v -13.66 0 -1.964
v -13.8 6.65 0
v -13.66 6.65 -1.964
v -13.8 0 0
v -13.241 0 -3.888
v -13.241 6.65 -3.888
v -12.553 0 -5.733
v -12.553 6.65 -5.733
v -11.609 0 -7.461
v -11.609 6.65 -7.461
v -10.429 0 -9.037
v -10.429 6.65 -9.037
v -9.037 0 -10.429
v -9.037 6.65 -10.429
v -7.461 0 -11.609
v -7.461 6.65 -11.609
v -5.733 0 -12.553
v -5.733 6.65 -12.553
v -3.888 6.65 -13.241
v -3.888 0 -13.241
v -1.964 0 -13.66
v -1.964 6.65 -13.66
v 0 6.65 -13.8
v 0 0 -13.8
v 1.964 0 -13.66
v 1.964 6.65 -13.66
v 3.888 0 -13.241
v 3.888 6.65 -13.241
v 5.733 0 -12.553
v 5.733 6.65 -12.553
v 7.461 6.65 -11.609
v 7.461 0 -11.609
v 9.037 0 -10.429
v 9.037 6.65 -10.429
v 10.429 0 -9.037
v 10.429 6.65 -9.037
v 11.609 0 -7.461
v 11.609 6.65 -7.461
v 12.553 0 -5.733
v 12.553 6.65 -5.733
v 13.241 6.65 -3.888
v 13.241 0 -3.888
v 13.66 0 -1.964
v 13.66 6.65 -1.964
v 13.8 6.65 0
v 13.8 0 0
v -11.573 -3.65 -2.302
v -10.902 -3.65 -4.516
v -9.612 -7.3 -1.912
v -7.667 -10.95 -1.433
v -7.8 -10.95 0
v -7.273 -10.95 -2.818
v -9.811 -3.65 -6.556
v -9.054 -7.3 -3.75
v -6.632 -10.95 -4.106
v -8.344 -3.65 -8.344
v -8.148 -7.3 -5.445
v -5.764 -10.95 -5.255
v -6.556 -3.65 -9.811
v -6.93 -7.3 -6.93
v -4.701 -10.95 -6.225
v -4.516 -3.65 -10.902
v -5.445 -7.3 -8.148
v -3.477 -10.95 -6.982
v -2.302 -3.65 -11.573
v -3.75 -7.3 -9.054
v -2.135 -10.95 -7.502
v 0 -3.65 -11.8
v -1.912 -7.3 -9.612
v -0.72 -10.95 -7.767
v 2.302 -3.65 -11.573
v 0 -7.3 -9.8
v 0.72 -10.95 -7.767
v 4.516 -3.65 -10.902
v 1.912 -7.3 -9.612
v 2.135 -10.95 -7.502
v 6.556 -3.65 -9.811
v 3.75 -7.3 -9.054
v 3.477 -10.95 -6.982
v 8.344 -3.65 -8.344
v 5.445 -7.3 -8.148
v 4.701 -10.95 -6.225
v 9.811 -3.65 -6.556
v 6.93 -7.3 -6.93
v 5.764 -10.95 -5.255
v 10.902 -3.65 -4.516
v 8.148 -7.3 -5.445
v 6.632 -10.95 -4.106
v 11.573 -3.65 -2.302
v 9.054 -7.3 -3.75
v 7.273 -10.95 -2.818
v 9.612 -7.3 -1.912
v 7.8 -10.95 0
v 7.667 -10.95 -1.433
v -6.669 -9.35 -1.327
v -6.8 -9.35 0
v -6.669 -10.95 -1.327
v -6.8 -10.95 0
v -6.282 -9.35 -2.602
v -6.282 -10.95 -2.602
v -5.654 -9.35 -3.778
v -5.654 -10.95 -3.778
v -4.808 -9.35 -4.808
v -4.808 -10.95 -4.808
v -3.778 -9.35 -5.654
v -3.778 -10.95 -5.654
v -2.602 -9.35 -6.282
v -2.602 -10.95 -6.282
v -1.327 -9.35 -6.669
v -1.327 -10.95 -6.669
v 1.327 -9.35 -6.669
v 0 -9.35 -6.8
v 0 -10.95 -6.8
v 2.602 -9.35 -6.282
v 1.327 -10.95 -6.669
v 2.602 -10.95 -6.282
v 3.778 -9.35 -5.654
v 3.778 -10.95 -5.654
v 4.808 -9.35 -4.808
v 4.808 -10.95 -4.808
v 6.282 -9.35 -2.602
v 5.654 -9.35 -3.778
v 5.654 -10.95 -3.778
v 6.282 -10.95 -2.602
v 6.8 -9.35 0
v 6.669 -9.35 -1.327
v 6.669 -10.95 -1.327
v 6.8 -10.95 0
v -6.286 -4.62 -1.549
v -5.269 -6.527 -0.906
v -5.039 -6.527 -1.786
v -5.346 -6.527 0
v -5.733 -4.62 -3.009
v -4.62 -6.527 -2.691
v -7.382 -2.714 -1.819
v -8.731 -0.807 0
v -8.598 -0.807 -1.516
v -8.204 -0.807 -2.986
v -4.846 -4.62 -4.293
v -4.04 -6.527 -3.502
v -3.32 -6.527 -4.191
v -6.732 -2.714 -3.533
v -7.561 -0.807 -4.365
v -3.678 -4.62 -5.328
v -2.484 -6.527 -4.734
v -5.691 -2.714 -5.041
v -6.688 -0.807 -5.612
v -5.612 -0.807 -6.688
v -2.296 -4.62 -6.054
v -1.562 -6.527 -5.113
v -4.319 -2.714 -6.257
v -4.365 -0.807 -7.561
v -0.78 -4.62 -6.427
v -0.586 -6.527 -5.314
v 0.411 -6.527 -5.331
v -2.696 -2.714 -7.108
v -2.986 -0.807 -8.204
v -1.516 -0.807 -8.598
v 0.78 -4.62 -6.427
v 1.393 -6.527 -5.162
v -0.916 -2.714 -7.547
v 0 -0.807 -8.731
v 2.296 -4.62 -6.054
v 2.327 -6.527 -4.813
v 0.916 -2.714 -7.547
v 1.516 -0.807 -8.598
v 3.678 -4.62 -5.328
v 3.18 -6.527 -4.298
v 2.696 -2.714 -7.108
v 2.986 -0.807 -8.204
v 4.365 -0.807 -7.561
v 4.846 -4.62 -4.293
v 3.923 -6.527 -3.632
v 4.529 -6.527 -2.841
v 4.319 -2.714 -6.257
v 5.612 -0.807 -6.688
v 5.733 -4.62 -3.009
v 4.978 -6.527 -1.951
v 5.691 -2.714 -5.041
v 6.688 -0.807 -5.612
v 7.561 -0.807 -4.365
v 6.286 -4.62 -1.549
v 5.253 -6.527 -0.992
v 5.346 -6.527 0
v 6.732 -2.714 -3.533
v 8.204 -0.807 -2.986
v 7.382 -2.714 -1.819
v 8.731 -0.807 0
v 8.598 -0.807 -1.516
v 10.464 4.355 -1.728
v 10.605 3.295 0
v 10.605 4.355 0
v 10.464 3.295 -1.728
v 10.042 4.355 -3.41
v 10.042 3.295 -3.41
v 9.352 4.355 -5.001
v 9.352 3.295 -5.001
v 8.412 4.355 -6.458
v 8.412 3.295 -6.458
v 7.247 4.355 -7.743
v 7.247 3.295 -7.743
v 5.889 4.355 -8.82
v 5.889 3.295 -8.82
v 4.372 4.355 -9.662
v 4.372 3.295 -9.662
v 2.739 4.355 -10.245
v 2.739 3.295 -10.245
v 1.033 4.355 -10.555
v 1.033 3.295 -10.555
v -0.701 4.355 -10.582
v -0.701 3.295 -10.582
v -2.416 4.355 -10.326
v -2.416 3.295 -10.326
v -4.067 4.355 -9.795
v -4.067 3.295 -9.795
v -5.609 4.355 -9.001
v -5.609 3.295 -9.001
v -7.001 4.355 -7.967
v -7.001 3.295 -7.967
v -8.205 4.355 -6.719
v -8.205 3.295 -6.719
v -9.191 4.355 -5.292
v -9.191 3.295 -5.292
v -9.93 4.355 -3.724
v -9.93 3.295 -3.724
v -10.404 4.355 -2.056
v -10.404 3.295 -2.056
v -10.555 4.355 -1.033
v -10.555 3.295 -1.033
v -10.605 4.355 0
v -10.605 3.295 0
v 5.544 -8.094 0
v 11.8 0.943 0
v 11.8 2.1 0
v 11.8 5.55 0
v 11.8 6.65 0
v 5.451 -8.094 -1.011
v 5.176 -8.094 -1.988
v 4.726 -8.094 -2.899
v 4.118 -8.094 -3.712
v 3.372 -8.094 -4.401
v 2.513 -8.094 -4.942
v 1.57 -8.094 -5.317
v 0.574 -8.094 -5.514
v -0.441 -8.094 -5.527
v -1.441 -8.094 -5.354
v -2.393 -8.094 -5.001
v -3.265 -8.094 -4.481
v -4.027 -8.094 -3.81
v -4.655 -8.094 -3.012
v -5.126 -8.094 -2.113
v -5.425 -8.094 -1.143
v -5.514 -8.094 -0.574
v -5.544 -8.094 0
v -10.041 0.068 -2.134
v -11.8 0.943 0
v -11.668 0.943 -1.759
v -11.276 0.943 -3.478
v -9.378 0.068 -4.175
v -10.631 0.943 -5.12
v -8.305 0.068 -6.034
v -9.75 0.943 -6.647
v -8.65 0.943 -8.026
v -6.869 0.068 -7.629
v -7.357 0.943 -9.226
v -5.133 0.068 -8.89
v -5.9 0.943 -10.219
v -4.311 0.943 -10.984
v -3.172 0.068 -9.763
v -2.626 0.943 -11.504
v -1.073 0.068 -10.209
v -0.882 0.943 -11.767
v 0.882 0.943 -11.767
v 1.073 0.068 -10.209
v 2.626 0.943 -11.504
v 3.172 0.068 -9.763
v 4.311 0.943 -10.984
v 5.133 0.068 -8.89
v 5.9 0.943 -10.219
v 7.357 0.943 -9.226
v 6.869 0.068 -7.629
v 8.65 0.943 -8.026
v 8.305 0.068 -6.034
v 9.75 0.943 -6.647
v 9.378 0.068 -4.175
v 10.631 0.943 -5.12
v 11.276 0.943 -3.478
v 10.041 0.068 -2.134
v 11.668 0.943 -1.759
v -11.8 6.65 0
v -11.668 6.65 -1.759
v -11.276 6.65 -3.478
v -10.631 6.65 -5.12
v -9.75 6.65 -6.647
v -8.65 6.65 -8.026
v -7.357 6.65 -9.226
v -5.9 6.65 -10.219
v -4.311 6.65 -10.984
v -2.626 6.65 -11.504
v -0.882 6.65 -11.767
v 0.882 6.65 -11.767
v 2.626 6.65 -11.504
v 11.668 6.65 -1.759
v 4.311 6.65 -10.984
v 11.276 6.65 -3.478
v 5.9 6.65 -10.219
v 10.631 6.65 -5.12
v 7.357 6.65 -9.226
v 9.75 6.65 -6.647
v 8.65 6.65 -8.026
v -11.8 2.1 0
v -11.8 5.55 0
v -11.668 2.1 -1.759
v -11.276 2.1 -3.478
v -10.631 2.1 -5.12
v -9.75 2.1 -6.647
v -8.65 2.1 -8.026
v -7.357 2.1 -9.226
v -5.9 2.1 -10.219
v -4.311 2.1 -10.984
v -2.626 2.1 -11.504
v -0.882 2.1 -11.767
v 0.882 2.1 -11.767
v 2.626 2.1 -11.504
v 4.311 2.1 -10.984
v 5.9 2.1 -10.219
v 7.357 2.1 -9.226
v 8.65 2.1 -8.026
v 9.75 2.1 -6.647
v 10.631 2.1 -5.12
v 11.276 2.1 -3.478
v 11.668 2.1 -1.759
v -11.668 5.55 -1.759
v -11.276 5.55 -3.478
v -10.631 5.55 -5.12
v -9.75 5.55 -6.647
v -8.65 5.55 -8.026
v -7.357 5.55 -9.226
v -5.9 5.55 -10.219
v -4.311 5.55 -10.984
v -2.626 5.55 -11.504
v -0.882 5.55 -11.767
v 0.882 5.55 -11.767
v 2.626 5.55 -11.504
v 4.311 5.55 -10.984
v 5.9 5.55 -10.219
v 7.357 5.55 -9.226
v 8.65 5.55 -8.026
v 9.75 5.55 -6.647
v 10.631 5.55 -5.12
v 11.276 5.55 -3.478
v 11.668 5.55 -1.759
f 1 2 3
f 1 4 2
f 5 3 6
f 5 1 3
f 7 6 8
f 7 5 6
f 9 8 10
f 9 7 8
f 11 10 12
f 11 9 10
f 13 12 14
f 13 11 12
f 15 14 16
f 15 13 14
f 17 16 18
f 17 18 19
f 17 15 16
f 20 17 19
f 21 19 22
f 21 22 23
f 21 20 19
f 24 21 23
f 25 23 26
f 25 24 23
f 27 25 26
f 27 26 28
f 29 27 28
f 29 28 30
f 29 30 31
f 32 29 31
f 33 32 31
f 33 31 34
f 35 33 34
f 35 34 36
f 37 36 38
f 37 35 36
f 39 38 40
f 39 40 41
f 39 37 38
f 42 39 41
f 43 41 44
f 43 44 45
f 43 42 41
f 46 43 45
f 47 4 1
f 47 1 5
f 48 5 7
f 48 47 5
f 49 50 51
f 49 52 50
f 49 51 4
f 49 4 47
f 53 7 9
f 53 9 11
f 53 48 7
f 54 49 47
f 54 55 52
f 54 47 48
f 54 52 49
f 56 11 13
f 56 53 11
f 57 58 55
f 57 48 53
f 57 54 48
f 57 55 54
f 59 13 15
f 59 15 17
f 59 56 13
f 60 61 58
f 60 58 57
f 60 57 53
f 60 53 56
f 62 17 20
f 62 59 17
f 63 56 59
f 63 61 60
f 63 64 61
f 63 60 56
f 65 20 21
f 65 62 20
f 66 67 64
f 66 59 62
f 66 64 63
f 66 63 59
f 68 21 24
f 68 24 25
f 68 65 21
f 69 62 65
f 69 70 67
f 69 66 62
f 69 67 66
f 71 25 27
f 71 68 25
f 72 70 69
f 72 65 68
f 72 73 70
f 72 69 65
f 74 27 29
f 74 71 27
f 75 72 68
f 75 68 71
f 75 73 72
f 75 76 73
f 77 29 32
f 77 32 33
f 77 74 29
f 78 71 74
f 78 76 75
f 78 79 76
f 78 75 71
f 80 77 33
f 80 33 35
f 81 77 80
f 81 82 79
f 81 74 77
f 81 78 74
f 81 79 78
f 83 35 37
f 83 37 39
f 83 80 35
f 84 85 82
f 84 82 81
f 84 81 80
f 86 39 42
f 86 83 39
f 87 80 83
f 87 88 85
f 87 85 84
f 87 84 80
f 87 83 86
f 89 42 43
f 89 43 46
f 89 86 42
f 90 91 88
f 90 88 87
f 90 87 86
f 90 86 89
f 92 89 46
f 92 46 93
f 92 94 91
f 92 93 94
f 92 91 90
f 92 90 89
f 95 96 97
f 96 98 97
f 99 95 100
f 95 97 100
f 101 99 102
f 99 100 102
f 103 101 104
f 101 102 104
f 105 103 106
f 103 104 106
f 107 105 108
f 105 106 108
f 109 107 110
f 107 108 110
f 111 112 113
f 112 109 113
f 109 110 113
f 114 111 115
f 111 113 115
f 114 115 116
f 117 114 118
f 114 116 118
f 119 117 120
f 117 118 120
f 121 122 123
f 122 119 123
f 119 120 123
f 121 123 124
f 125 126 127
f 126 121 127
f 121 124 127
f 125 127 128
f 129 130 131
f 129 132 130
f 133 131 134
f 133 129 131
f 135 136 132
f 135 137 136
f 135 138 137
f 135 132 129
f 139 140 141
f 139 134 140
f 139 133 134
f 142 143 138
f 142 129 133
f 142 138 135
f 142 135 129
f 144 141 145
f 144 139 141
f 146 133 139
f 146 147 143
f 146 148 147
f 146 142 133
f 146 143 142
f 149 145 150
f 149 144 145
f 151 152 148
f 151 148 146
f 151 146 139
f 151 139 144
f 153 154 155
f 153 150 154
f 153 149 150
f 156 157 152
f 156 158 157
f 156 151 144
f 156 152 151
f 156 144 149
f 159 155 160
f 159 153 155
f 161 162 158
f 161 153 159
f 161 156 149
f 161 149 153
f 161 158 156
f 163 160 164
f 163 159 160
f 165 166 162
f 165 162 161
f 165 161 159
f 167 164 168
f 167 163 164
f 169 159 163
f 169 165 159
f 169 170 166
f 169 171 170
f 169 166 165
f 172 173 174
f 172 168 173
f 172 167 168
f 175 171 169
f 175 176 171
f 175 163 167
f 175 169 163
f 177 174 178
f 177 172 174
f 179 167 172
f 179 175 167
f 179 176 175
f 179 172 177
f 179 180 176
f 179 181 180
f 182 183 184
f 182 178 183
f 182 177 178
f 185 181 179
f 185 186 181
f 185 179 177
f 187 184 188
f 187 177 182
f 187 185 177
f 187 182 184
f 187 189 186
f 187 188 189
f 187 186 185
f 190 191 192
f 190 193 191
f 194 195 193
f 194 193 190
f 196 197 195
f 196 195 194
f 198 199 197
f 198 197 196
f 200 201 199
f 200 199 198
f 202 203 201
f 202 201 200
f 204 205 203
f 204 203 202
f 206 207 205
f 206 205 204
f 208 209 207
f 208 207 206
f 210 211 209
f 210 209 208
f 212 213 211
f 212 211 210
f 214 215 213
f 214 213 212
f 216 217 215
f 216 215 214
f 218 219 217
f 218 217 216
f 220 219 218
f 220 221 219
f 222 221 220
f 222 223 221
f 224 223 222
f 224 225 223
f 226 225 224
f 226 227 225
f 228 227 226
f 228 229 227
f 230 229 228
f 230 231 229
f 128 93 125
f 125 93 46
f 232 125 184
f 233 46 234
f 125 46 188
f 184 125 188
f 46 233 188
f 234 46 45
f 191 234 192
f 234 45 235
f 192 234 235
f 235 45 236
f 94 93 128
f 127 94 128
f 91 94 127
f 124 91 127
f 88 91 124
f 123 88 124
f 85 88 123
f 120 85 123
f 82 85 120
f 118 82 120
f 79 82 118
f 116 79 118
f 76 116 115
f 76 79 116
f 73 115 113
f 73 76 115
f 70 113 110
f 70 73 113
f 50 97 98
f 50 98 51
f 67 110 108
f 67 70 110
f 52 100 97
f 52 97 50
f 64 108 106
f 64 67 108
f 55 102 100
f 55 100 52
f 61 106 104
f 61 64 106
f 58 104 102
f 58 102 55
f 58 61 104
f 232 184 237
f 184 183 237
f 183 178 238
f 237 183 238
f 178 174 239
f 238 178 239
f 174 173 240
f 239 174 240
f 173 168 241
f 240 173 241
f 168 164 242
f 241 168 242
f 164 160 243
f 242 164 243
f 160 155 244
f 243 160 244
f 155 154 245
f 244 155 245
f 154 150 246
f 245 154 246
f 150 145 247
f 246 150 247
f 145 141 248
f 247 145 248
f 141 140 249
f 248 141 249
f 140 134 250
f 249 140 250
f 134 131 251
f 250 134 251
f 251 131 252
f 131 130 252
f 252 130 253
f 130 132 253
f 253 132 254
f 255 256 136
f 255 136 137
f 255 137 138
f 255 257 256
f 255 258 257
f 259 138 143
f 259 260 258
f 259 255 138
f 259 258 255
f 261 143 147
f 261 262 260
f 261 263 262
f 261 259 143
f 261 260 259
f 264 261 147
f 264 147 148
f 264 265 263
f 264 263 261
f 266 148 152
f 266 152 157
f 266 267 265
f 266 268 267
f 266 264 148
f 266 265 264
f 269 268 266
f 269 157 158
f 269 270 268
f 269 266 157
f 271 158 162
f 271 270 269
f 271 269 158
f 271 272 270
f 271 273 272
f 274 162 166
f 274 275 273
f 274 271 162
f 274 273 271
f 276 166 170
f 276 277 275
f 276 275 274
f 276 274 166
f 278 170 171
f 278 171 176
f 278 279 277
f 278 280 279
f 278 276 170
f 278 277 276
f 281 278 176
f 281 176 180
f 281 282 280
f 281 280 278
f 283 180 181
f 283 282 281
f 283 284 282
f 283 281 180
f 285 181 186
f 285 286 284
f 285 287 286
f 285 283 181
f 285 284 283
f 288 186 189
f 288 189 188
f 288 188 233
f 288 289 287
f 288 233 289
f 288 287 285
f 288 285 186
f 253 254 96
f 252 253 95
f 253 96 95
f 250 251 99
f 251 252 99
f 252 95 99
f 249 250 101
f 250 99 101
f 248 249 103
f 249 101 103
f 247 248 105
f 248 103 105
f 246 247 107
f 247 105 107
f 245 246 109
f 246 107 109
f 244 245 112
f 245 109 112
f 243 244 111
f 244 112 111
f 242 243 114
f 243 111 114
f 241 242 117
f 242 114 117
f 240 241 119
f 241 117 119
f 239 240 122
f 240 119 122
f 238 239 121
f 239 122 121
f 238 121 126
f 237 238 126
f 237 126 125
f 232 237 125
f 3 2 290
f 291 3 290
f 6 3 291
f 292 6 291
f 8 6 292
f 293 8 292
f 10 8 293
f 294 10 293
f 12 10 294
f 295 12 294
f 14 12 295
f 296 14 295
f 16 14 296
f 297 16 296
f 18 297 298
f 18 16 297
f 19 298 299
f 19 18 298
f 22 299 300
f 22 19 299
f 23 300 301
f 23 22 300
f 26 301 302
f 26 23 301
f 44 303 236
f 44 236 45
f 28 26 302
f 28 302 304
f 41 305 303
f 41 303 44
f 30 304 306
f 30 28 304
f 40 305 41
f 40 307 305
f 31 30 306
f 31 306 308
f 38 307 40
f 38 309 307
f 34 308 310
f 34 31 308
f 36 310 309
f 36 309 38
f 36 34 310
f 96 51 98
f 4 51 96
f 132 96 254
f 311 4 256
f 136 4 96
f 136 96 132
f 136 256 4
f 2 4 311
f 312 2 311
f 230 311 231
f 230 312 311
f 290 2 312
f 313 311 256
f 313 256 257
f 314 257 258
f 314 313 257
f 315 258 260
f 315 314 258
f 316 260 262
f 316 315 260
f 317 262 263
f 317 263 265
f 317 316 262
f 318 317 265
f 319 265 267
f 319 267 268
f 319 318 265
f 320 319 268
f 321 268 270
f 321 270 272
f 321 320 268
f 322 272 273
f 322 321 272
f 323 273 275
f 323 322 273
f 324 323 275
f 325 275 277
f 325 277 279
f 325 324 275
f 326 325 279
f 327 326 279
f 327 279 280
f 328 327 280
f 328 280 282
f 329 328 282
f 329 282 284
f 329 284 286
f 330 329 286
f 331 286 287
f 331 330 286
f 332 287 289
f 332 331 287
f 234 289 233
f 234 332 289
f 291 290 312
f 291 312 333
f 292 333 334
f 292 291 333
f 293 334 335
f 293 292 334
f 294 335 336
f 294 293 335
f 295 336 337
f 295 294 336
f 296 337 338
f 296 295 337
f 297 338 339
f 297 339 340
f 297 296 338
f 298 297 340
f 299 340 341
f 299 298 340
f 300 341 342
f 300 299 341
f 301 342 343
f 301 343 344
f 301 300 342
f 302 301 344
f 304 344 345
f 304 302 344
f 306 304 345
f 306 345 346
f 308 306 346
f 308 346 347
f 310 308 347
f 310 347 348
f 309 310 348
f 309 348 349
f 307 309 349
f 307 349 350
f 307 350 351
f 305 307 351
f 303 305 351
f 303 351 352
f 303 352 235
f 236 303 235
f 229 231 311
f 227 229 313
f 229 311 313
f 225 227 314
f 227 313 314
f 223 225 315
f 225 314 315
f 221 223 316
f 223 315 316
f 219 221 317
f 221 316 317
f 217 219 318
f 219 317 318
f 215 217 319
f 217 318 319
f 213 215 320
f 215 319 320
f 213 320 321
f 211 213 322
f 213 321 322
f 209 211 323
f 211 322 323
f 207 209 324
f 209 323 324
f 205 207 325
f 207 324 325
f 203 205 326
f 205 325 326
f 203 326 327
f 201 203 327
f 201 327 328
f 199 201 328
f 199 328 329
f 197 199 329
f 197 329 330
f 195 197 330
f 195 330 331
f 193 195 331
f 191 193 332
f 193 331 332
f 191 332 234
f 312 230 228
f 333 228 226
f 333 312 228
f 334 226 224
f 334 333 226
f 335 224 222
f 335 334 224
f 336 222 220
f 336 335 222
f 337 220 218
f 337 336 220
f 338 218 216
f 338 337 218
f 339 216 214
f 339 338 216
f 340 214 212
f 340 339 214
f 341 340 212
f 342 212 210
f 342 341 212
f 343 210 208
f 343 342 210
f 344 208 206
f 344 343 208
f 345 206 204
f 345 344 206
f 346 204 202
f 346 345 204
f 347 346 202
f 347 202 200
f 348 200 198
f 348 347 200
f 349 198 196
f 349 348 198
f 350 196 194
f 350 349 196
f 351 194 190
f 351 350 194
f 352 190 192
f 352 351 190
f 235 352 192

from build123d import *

# Parameters (mm, degrees)
F1_ANGLE     = 180
F2_T4_ANGLE  = 243.2500896942
F2_S5_R      = 11.8
F2_T6_DEPTH  = 16
F3_T4_ANGLE  = 243.6352501502
F3_S5_R      = 11.8
F3_T6_DEPTH  = 16
F4_T4_ANGLE  = 309.1355997924
F4_S5_R      = 6.8
F4_T6_DEPTH  = 11
F4_T10_ANGLE = 243.2500896942
F4_S11_R     = 11.8
F4_T12_DEPTH = 16
F5_SIZE      = 0.75
F6_SIZE      = 1


# Not quite as in the source:
# - a fillet or chamfer that OpenCascade refuses, or shapes differently, is made with other operations: its cross-section is extruded or revolved along the edge and cut away or added
# - a feature names something its author has since deleted; it is built from what else it names


with BuildPart() as f1:
    # F0 (on Top) → F1 (revolve)
    with BuildSketch(Plane.XY):
        Polygon((-11.8, 5.65), (-11.8, 6.65), (-13.8, 6.65), (-13.8, 0), (-7.8, -10.95), (-6.8, -10.95), (-6.8, -9.45), (-4.8, -9.45), (-4.8, -7.45), (-9.8, 1), (-11.8, 1), (-11.8, 2), (-9.8, 2), (-9.8, 5.65), align=None)
    revolve(axis=Axis((0, 0, 0), (0, -1, 0)), revolution_arc=F1_ANGLE)

    # F2: chamfer of 2.1 on 1 edges, made by hand


with BuildPart() as f2_tool2:
    # F2_s3 → F2_t4 (revolve)
    with BuildSketch(Plane(origin=(0, 0, 0), x_dir=(0, 1, 0), z_dir=(0.5243581586, 0, 0.8514978107))):
        Polygon((3.55, 9.8), (5.65, 11.9), (5.65, 9.8), align=None)
    revolve(axis=Axis((0, 5.65, 0), (0, -1, 0)), revolution_arc=F2_T4_ANGLE)

    # F2_s5 → F2_t6 (intersect, symmetric)
    with BuildSketch(Plane.XZ.offset(-4.6)):
        Circle(F2_S5_R)
    extrude(amount=F2_T6_DEPTH, both=True, mode=Mode.INTERSECT)


with BuildPart() as f1_1:
    add(f1.part)

    # F2_t1: cut F2_tool2
    add(f2_tool2.part, mode=Mode.SUBTRACT)

    # F3: chamfer of 2.1 on 1 edges, made by hand


with BuildPart() as f3_tool2:
    # F3_s3 → F3_t4 (revolve)
    with BuildSketch(Plane(origin=(0, 0, 0), x_dir=(0, 1, 0), z_dir=(0.5272172108, 0, 0.849730553))):
        Polygon((-0.8073066866, 8.7305877594), (1, 11.9), (1, 9.8), align=None)
    revolve(axis=Axis((0, 1, 0), (0, -1, 0)), revolution_arc=F3_T4_ANGLE)

    # F3_s5 → F3_t6 (intersect, symmetric)
    with BuildSketch(Plane.XZ.offset(-0.1)):
        Circle(F3_S5_R)
    extrude(amount=F3_T6_DEPTH, both=True, mode=Mode.INTERSECT)


with BuildPart() as f1_2:
    add(f1_1.part)

    # F3_t1: cut F3_tool2
    add(f3_tool2.part, mode=Mode.SUBTRACT)

    # F4: chamfer of 2.1 on 2 edges, made by hand


with BuildPart() as f4_tool2:
    # F4_s3 → F4_t4 (revolve)
    with BuildSketch(Plane(origin=(0, 0, 0), x_dir=(0, 1, 0), z_dir=(0.9030940896, 0, 0.4294427381))):
        Polygon((-7.35, 4.8), (-9.45, 6.9), (-9.45, 4.8), align=None)
    revolve(axis=Axis((0, -9.45, 0), (0, -1, 0)), revolution_arc=F4_T4_ANGLE)

    # F4_s5 → F4_t6 (intersect, symmetric)
    with BuildSketch(Plane.XZ.offset(8.4)):
        Circle(F4_S5_R)
    extrude(amount=F4_T6_DEPTH, both=True, mode=Mode.INTERSECT)


with BuildPart() as f1_3:
    add(f1_2.part)

    # F4_t1: cut F4_tool2
    add(f4_tool2.part, mode=Mode.SUBTRACT)


with BuildPart() as f4_tool8:
    # F4_s9 → F4_t10 (revolve)
    with BuildSketch(Plane(origin=(0, 0, 0), x_dir=(0, 1, 0), z_dir=(0.5243581586, 0, 0.8514978107))):
        Polygon((4.1, 9.8), (2, 11.9), (2, 9.8), align=None)
    revolve(axis=Axis((0, 2, 0), (0, -1, 0)), revolution_arc=F4_T10_ANGLE)

    # F4_s11 → F4_t12 (intersect, symmetric)
    with BuildSketch(Plane.XZ.offset(-3)):
        Circle(F4_S11_R)
    extrude(amount=F4_T12_DEPTH, both=True, mode=Mode.INTERSECT)


with BuildPart() as f1_4:
    add(f1_3.part)

    # F4_t7: cut F4_tool8
    add(f4_tool8.part, mode=Mode.SUBTRACT)

    # F5
    f5_edges = [f1_4.edges().sort_by_distance(p)[0] for p in [
        (0, 3.825, -10.075),
    ]]
    chamfer(f5_edges, length=F5_SIZE)

    # F6
    f6_edges = [f1_4.edges().sort_by_distance(p)[0] for p in [
        (0, -7.387175, -4.837175),
    ]]
    chamfer(f6_edges, length=F6_SIZE)


solid = f1_4.part
